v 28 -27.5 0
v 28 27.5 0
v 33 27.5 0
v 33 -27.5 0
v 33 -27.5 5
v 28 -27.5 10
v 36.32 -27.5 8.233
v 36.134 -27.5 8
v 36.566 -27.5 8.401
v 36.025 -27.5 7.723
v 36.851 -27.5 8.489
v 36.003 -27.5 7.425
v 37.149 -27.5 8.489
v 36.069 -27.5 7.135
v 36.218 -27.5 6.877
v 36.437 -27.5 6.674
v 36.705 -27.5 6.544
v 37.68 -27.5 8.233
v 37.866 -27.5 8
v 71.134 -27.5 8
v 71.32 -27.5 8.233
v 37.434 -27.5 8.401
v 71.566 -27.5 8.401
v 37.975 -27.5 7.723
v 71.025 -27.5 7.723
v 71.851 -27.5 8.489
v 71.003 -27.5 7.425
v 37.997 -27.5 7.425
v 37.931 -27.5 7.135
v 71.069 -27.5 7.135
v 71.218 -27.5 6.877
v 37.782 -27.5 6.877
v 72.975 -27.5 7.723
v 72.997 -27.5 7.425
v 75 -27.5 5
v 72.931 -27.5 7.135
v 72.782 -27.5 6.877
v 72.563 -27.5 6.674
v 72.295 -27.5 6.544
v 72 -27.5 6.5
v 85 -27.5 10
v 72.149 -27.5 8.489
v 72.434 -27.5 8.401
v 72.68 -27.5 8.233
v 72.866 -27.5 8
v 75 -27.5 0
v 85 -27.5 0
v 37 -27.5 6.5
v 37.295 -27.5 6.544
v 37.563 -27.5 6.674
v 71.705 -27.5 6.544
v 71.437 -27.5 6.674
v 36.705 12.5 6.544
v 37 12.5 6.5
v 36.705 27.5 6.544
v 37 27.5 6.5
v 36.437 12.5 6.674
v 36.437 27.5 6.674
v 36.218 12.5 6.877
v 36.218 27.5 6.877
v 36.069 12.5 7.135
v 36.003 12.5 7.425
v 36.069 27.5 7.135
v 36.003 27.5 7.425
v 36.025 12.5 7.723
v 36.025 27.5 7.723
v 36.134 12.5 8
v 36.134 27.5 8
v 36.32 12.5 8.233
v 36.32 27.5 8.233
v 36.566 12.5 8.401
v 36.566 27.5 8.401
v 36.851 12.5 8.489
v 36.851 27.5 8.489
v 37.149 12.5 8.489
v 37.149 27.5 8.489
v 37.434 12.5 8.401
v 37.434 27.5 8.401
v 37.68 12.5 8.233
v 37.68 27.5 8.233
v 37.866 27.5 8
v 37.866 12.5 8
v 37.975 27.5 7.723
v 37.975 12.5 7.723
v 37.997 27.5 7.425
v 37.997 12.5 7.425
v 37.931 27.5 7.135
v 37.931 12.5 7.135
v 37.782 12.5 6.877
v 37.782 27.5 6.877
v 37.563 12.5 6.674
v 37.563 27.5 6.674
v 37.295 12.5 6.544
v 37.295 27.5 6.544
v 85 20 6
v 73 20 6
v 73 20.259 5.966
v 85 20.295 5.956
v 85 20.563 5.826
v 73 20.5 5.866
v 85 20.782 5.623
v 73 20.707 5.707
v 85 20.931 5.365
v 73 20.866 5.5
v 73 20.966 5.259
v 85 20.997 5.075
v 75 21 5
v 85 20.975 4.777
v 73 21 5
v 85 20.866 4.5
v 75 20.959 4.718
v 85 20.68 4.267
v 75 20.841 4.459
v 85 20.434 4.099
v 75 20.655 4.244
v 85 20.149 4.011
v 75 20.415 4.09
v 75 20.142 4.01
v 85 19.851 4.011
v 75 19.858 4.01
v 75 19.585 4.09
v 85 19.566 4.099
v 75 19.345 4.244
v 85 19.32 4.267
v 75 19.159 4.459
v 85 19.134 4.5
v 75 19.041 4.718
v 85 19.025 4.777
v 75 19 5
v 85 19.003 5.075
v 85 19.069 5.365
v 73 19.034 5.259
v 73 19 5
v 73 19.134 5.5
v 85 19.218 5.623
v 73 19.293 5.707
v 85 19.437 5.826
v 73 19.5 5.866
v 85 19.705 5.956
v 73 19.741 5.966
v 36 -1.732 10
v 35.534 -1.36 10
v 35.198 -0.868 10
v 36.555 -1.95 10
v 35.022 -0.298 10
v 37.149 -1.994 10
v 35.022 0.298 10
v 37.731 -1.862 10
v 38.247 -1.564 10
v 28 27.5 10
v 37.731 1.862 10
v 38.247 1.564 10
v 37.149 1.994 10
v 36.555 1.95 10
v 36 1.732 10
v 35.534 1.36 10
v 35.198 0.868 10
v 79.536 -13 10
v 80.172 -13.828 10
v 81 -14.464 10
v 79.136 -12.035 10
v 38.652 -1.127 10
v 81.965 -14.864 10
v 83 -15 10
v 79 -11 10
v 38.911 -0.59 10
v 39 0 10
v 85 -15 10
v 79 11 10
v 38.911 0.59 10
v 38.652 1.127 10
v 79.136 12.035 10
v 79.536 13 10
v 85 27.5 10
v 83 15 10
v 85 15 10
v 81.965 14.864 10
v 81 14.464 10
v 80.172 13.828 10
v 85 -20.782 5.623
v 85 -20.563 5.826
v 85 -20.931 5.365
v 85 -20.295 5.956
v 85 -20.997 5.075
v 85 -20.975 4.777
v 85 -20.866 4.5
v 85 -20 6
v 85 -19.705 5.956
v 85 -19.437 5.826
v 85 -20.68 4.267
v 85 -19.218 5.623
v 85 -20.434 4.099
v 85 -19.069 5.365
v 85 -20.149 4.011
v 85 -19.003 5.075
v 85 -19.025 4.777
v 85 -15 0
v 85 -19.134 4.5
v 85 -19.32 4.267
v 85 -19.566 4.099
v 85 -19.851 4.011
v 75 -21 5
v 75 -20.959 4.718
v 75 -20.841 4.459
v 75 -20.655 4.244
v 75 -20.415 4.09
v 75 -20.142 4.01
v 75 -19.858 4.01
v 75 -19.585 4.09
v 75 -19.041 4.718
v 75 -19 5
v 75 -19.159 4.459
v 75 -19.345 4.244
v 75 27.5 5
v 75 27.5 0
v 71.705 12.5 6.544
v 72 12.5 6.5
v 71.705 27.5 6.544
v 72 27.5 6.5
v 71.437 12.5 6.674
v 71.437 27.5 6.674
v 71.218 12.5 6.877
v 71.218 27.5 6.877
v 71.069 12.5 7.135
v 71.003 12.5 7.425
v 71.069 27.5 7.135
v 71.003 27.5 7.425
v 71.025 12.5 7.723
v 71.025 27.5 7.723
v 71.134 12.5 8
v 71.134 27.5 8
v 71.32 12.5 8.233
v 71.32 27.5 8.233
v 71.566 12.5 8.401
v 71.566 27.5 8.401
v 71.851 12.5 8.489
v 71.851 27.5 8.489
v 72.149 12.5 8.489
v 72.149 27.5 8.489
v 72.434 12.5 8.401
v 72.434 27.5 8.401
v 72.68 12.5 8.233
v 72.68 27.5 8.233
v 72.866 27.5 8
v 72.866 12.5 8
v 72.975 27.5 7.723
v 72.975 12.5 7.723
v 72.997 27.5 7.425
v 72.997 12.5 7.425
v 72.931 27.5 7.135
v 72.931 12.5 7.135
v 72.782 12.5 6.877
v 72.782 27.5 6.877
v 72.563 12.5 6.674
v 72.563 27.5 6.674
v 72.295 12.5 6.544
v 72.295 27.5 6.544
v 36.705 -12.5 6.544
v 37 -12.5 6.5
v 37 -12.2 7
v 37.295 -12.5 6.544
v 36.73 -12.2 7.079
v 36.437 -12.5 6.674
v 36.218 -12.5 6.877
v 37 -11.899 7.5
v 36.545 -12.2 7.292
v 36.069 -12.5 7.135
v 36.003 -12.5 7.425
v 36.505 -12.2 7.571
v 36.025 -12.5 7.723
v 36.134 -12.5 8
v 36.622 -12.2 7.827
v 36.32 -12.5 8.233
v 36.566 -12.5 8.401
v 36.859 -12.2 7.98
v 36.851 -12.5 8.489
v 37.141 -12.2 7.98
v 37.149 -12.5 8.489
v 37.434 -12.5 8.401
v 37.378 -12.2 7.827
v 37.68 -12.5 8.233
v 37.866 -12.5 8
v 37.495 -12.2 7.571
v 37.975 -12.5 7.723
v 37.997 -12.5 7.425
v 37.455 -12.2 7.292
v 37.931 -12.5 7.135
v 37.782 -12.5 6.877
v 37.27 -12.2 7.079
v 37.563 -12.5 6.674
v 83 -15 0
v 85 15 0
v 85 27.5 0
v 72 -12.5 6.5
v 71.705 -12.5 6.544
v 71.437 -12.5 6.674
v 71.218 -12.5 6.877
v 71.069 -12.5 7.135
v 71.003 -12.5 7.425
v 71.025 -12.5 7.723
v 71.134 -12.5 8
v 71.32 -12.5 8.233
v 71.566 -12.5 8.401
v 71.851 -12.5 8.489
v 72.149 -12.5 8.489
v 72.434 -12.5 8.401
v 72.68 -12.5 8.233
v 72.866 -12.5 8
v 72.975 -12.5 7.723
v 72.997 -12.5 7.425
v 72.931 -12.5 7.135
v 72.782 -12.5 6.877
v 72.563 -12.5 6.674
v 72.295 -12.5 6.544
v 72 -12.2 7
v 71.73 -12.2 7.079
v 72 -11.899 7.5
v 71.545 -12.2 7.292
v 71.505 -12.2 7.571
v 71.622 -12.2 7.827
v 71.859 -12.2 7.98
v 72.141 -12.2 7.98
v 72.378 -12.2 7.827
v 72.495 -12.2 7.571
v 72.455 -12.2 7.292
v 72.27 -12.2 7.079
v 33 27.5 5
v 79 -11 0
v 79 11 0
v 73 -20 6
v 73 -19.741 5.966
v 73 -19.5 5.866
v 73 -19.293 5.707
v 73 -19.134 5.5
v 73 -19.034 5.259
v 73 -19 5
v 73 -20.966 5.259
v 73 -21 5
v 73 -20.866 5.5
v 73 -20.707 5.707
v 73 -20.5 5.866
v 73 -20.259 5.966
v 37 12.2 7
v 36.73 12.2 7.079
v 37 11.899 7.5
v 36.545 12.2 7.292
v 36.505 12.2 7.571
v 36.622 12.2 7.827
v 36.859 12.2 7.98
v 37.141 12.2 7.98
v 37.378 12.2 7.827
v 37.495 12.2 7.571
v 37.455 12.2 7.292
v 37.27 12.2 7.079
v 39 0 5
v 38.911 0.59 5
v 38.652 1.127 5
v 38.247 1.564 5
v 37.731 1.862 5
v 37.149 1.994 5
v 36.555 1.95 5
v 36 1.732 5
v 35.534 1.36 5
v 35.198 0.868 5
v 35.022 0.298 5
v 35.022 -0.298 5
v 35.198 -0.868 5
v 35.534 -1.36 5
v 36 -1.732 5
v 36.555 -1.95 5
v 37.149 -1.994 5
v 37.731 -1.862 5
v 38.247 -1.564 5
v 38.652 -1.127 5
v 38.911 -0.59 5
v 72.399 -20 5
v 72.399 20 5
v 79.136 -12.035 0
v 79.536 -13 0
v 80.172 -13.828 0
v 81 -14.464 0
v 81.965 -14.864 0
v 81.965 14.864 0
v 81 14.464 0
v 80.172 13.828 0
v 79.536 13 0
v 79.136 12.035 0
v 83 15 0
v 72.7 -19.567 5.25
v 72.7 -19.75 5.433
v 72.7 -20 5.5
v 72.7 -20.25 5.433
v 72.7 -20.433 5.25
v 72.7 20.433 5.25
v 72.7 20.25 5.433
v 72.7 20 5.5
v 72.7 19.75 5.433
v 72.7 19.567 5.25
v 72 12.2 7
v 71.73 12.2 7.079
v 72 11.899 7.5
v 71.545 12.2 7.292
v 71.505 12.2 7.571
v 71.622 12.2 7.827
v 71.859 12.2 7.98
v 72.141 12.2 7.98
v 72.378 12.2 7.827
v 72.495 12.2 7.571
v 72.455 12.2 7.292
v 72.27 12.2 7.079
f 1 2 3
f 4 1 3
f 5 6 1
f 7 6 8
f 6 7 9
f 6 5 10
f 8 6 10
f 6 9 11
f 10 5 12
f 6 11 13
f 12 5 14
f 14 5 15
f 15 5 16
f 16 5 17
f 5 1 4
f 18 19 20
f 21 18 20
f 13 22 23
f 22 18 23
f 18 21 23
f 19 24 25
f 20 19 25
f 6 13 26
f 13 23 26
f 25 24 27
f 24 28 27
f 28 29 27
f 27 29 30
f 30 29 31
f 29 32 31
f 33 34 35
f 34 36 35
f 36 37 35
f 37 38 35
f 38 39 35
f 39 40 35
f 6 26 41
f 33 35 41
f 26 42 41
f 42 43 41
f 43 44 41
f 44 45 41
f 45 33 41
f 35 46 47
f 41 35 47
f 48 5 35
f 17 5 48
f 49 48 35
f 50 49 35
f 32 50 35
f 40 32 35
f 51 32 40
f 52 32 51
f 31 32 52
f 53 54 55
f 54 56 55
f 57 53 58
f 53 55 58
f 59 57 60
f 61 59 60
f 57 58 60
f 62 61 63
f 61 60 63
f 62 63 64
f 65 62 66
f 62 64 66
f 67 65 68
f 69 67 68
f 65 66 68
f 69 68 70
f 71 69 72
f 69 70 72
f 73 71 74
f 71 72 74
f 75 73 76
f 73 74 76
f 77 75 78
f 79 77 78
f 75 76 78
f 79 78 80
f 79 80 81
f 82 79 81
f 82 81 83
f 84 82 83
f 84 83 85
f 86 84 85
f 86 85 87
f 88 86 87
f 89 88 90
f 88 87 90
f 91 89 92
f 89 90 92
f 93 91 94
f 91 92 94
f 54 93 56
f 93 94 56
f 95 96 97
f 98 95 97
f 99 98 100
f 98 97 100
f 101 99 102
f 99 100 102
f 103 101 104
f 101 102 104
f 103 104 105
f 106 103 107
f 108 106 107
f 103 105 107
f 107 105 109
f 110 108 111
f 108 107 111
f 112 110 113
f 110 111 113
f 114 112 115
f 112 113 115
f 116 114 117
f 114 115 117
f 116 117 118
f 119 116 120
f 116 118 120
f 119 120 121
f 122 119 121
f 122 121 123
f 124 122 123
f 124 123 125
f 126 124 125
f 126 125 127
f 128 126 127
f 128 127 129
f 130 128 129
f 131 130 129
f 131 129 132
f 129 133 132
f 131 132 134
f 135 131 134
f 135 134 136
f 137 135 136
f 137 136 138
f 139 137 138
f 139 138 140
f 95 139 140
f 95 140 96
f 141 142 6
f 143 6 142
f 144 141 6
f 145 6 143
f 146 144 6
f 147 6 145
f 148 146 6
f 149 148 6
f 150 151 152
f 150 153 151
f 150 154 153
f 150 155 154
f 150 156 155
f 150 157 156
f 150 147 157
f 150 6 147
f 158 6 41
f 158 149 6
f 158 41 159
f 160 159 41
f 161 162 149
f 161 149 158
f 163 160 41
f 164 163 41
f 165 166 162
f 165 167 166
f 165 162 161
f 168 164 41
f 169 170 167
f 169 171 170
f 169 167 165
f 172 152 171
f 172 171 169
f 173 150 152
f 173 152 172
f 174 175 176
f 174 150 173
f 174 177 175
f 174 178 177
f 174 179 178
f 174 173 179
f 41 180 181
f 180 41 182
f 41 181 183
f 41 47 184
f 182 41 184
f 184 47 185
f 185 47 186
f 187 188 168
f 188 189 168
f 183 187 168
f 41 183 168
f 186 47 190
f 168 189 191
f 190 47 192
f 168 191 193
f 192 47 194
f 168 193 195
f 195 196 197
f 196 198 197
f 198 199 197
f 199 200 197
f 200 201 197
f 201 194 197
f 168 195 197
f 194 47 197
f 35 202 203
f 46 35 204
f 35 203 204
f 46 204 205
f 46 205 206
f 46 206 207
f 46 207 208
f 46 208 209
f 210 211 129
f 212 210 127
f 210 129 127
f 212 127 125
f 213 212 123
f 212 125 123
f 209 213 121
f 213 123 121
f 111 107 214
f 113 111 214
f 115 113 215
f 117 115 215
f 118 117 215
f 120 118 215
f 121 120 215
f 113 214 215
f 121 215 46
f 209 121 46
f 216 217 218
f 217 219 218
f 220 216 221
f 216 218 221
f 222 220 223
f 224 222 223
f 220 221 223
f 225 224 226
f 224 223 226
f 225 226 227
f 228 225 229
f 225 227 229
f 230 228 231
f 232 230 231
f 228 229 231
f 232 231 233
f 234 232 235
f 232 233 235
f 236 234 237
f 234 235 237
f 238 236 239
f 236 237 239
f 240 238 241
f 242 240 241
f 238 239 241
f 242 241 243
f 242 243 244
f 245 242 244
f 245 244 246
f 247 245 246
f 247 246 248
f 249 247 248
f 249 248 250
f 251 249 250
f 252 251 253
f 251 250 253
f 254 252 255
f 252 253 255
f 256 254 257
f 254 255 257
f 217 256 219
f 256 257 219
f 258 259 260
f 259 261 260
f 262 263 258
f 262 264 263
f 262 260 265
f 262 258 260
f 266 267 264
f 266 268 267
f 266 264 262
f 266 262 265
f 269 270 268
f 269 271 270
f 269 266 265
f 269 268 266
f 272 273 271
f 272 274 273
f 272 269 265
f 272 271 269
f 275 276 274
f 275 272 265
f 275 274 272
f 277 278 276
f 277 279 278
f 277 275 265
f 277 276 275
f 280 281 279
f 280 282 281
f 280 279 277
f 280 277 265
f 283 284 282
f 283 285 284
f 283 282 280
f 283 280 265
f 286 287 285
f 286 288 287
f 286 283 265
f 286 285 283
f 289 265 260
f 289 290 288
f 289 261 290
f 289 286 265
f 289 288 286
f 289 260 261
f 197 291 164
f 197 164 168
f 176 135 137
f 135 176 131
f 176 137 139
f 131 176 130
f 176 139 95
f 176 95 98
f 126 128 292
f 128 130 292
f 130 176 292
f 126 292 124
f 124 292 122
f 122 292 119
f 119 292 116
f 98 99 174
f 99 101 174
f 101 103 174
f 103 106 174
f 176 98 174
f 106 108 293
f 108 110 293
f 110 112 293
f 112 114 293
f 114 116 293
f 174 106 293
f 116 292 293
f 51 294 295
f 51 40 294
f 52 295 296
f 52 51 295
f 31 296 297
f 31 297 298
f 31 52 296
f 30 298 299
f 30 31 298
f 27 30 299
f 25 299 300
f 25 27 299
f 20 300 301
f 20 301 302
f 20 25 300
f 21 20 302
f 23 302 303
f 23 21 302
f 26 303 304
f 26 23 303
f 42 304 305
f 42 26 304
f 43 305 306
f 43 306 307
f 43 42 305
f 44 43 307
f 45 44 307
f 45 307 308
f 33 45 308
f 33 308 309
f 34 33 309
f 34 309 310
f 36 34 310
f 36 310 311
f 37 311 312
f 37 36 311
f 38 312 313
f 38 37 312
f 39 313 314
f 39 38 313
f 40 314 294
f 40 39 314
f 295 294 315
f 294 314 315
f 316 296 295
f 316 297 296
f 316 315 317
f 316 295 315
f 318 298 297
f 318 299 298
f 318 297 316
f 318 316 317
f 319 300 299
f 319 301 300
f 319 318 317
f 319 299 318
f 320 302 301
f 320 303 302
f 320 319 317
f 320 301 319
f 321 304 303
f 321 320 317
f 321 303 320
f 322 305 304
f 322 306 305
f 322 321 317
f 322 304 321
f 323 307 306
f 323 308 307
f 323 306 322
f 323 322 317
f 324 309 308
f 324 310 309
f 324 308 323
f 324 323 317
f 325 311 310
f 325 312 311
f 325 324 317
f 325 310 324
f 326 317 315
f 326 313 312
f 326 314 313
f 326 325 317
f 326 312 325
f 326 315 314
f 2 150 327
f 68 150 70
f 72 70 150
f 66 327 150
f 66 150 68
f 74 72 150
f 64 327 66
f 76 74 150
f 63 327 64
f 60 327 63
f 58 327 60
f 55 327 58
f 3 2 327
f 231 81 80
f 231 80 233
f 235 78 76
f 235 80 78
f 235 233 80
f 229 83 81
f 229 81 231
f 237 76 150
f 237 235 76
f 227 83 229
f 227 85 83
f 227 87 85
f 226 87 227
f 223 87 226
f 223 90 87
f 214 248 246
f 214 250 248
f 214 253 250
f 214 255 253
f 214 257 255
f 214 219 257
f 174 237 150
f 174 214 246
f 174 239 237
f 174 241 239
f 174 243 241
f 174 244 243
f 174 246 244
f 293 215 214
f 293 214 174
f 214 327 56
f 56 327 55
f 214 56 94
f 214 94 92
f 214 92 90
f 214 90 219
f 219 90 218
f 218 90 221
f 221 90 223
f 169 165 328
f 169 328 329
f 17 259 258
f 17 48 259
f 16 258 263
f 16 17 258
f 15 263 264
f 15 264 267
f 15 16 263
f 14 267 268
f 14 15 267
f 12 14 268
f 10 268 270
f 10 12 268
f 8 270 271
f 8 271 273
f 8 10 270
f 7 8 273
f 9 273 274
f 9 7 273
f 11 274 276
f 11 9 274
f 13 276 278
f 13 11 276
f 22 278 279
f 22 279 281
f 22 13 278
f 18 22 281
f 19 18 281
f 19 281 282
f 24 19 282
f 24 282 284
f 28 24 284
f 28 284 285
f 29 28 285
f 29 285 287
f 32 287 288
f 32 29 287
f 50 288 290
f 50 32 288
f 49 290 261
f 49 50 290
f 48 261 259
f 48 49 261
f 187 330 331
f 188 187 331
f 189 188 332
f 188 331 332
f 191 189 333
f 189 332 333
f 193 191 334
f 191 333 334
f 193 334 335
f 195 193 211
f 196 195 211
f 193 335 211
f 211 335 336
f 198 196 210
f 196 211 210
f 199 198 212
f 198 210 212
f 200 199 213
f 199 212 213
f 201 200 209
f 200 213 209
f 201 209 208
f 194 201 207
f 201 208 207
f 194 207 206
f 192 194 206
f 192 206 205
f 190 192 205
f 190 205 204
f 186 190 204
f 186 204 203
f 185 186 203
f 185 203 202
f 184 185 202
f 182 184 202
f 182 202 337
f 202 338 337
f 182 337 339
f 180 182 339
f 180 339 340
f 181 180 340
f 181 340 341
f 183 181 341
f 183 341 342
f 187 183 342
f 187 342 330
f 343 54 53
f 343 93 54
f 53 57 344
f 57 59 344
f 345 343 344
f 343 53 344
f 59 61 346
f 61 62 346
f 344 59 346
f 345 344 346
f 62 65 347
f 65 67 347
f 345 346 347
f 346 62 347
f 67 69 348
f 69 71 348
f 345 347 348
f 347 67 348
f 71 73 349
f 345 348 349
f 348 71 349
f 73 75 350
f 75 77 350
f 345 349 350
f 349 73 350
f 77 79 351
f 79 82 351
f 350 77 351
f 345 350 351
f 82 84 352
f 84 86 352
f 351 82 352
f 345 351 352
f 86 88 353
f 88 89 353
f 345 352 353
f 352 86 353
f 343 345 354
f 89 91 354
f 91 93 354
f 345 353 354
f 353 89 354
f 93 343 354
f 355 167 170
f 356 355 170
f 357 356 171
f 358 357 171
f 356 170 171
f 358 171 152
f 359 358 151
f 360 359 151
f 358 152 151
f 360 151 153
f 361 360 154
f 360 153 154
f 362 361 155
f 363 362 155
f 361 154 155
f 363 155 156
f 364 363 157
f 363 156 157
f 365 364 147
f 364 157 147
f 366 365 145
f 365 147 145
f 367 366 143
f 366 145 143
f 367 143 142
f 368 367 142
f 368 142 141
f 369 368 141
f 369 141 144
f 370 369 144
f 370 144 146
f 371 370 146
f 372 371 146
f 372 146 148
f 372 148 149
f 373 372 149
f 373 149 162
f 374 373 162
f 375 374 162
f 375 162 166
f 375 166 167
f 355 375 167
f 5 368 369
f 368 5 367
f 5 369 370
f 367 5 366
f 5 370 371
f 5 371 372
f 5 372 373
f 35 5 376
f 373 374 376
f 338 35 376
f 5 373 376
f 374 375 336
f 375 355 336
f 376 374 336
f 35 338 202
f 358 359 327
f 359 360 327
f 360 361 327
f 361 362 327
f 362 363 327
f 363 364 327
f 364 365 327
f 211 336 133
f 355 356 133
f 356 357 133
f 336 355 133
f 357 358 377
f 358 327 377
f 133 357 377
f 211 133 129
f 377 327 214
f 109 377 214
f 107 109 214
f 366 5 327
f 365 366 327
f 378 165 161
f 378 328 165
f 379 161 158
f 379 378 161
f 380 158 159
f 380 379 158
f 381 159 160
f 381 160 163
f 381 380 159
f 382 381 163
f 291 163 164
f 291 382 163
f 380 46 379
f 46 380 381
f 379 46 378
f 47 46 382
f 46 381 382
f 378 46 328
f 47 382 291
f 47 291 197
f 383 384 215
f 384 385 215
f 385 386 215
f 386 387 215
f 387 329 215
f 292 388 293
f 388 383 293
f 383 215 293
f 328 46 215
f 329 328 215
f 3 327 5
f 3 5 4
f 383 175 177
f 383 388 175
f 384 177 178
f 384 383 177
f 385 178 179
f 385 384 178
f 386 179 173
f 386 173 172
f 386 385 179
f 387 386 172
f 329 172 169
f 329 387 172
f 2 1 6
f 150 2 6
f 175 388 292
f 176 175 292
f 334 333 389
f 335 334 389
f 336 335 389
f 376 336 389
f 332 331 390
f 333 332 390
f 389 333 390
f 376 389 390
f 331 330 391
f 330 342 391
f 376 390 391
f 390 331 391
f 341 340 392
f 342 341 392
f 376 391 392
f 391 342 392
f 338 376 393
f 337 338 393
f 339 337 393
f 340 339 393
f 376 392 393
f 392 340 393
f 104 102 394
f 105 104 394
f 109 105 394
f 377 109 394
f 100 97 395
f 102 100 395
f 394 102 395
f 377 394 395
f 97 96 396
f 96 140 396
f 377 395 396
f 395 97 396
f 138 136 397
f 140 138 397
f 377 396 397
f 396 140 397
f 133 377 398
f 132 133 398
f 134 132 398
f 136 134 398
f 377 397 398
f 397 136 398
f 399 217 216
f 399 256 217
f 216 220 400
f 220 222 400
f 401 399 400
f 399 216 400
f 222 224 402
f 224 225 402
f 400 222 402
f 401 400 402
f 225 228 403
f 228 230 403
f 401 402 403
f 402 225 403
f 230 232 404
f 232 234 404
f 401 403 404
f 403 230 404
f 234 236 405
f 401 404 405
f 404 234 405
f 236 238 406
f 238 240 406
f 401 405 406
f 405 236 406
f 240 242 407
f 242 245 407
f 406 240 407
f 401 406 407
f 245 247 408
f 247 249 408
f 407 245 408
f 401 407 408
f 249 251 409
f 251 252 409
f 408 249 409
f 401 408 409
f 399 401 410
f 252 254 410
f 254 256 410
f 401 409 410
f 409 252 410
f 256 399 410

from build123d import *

# Parameters (mm, degrees)
ESQUISSE1_W                    = 85
ESQUISSE1_H                    = 55
BOSS_EXTRU_1_DEPTH             = 10
ESQUISSE2_W                    = 8
ESQUISSE2_H                    = 5
ESQUISSE2_W_2                  = 42
ENL_V_MAT_EXTRU_1_DEPTH        = 102.734949747
ESQUISSE3_R                    = 2
ENL_V_MAT_EXTRU_2_DEPTH        = 90.895772982
TROU_TARAUD_M3X0_51_AT_2_COUNT = 2
TROU_TARAUD_M3X0_51_AT_2_PITCH = 33
TROU_TARAUD_M3X0_51_AT_3_COUNT = 2
TROU_TARAUD_M3X0_51_AT_3_PITCH = 68
TROU_TARAUD_M3X0_52_D          = 2
TROU_TARAUD_M3X0_52_DEPTH      = 12
TROU_TARAUD_M3X0_52_TIP        = 0.600860619
ESQUISSE8_W                    = 28
ESQUISSE8_H                    = 10
ENL_V_MAT_EXTRU_3_DEPTH        = 102.734949747
ESQUISSE9_W                    = 6
ESQUISSE9_H                    = 30
ENL_V_MAT_EXTRU_4_DEPTH        = 90.895772982
CONG_1_R                       = 4


with BuildPart() as part:
    # Esquisse1 → Boss.-Extru.1 (new body)
    with BuildSketch(Plane.XY):
        with Locations((42.5, 0)):
            Rectangle(ESQUISSE1_W, ESQUISSE1_H)
    extrude(amount=BOSS_EXTRU_1_DEPTH)

    # Esquisse2 → Enlèv. mat.-Extru.1 (cut, through all)
    with BuildSketch(Plane(origin=(0, 27.5, 0), x_dir=(1, 0, 0), z_dir=(0, 1, 0))):
        with Locations((4, -2.5)):
            Rectangle(ESQUISSE2_W, ESQUISSE2_H)
        with Locations((54, -2.5)):
            Rectangle(ESQUISSE2_W_2, ESQUISSE2_H)
    extrude(amount=-ENL_V_MAT_EXTRU_1_DEPTH, mode=Mode.SUBTRACT)

    # Esquisse3 → Enlèv. mat.-Extru.2 (cut, through all)
    with BuildSketch(Plane.XY.offset(10)):
        with Locations((4, 0)):
            Circle(ESQUISSE3_R)
        with Locations((37, 0)):
            Circle(ESQUISSE3_R)
    extrude(amount=-ENL_V_MAT_EXTRU_2_DEPTH, mode=Mode.SUBTRACT)

    # Esquisse4 → Trou taraudé M3x0.51 (revolve, cut)
    with BuildSketch(Plane(origin=(4, -27.5, 7.5), x_dir=(0, 0, -1), z_dir=(1, 0, 0))):
        Polygon((0, 0), (0, 15.600860619), (1, 15), (1, 0), align=None)
    trou_taraud_m3x0_51 = revolve(axis=Axis((4, -33.85, 7.5), (0, 1, 0)), mode=Mode.SUBTRACT)

    # Trou taraudé M3x0.51 at 2: Trou taraudé M3x0.51 ×2
    with Locations(*[(i * TROU_TARAUD_M3X0_51_AT_2_PITCH, 0, 0) for i in range(1, TROU_TARAUD_M3X0_51_AT_2_COUNT)]):
        add(trou_taraud_m3x0_51, mode=Mode.SUBTRACT)

    # Trou taraudé M3x0.51 at 3: Trou taraudé M3x0.51 ×2
    with Locations(*[(i * TROU_TARAUD_M3X0_51_AT_3_PITCH, 0, 0) for i in range(1, TROU_TARAUD_M3X0_51_AT_3_COUNT)]):
        add(trou_taraud_m3x0_51, mode=Mode.SUBTRACT)

    # Symétrie1: Trou taraudé M3x0.51 across plane
    add(trou_taraud_m3x0_51.mirror(Plane.ZX), mode=Mode.SUBTRACT)

    # Symétrie1 copy 1 sketch → Symétrie1 copy 1 (revolve, cut)
    with BuildSketch(Plane(origin=(37, 27.5, 7.5), x_dir=(0, 0, -1), z_dir=(1, 0, 0))):
        Polygon((0, 0), (0, -15.600860619), (1, -15), (1, 0), align=None)
    revolve(axis=Axis((37, 33.85, 7.5), (0, 1, 0)), mode=Mode.SUBTRACT)

    # Symétrie1 copy 2 sketch → Symétrie1 copy 2 (revolve, cut)
    with BuildSketch(Plane(origin=(72, 27.5, 7.5), x_dir=(0, 0, -1), z_dir=(1, 0, 0))):
        Polygon((0, 0), (0, -15.600860619), (1, -15), (1, 0), align=None)
    revolve(axis=Axis((72, 33.85, 7.5), (0, 1, 0)), mode=Mode.SUBTRACT)

    # Trou taraudé M3x0.52
    with Locations(Plane(origin=(85, 0, 0), x_dir=(0, 0, -1), z_dir=(1, 0, 0))):
        with Locations((-5, 20), (-5, -20)):
            Hole(TROU_TARAUD_M3X0_52_D / 2, depth=TROU_TARAUD_M3X0_52_DEPTH)
            with Locations((0, 0, -(TROU_TARAUD_M3X0_52_DEPTH + TROU_TARAUD_M3X0_52_TIP / 2))):  # 118° drill point
                Cone(0, TROU_TARAUD_M3X0_52_D / 2, TROU_TARAUD_M3X0_52_TIP, mode=Mode.SUBTRACT)

    # Esquisse8 → Enlèv. mat.-Extru.3 (cut, through all)
    with BuildSketch(Plane.XZ.offset(27.5)):
        with Locations((14, 5)):
            Rectangle(ESQUISSE8_W, ESQUISSE8_H)
    extrude(amount=-ENL_V_MAT_EXTRU_3_DEPTH, mode=Mode.SUBTRACT)

    # Esquisse9 → Enlèv. mat.-Extru.4 (cut, through all)
    with BuildSketch(Plane.XY.offset(10)):
        with Locations((82, 0)):
            Rectangle(ESQUISSE9_W, ESQUISSE9_H)
    extrude(amount=-ENL_V_MAT_EXTRU_4_DEPTH, mode=Mode.SUBTRACT)

    # Congé1
    cong_1_edges = [part.edges().sort_by_distance(p)[0] for p in [
        (79, -15, 5),
        (79, 15, 5),
    ]]
    fillet(cong_1_edges, radius=CONG_1_R)


solid = part.part
